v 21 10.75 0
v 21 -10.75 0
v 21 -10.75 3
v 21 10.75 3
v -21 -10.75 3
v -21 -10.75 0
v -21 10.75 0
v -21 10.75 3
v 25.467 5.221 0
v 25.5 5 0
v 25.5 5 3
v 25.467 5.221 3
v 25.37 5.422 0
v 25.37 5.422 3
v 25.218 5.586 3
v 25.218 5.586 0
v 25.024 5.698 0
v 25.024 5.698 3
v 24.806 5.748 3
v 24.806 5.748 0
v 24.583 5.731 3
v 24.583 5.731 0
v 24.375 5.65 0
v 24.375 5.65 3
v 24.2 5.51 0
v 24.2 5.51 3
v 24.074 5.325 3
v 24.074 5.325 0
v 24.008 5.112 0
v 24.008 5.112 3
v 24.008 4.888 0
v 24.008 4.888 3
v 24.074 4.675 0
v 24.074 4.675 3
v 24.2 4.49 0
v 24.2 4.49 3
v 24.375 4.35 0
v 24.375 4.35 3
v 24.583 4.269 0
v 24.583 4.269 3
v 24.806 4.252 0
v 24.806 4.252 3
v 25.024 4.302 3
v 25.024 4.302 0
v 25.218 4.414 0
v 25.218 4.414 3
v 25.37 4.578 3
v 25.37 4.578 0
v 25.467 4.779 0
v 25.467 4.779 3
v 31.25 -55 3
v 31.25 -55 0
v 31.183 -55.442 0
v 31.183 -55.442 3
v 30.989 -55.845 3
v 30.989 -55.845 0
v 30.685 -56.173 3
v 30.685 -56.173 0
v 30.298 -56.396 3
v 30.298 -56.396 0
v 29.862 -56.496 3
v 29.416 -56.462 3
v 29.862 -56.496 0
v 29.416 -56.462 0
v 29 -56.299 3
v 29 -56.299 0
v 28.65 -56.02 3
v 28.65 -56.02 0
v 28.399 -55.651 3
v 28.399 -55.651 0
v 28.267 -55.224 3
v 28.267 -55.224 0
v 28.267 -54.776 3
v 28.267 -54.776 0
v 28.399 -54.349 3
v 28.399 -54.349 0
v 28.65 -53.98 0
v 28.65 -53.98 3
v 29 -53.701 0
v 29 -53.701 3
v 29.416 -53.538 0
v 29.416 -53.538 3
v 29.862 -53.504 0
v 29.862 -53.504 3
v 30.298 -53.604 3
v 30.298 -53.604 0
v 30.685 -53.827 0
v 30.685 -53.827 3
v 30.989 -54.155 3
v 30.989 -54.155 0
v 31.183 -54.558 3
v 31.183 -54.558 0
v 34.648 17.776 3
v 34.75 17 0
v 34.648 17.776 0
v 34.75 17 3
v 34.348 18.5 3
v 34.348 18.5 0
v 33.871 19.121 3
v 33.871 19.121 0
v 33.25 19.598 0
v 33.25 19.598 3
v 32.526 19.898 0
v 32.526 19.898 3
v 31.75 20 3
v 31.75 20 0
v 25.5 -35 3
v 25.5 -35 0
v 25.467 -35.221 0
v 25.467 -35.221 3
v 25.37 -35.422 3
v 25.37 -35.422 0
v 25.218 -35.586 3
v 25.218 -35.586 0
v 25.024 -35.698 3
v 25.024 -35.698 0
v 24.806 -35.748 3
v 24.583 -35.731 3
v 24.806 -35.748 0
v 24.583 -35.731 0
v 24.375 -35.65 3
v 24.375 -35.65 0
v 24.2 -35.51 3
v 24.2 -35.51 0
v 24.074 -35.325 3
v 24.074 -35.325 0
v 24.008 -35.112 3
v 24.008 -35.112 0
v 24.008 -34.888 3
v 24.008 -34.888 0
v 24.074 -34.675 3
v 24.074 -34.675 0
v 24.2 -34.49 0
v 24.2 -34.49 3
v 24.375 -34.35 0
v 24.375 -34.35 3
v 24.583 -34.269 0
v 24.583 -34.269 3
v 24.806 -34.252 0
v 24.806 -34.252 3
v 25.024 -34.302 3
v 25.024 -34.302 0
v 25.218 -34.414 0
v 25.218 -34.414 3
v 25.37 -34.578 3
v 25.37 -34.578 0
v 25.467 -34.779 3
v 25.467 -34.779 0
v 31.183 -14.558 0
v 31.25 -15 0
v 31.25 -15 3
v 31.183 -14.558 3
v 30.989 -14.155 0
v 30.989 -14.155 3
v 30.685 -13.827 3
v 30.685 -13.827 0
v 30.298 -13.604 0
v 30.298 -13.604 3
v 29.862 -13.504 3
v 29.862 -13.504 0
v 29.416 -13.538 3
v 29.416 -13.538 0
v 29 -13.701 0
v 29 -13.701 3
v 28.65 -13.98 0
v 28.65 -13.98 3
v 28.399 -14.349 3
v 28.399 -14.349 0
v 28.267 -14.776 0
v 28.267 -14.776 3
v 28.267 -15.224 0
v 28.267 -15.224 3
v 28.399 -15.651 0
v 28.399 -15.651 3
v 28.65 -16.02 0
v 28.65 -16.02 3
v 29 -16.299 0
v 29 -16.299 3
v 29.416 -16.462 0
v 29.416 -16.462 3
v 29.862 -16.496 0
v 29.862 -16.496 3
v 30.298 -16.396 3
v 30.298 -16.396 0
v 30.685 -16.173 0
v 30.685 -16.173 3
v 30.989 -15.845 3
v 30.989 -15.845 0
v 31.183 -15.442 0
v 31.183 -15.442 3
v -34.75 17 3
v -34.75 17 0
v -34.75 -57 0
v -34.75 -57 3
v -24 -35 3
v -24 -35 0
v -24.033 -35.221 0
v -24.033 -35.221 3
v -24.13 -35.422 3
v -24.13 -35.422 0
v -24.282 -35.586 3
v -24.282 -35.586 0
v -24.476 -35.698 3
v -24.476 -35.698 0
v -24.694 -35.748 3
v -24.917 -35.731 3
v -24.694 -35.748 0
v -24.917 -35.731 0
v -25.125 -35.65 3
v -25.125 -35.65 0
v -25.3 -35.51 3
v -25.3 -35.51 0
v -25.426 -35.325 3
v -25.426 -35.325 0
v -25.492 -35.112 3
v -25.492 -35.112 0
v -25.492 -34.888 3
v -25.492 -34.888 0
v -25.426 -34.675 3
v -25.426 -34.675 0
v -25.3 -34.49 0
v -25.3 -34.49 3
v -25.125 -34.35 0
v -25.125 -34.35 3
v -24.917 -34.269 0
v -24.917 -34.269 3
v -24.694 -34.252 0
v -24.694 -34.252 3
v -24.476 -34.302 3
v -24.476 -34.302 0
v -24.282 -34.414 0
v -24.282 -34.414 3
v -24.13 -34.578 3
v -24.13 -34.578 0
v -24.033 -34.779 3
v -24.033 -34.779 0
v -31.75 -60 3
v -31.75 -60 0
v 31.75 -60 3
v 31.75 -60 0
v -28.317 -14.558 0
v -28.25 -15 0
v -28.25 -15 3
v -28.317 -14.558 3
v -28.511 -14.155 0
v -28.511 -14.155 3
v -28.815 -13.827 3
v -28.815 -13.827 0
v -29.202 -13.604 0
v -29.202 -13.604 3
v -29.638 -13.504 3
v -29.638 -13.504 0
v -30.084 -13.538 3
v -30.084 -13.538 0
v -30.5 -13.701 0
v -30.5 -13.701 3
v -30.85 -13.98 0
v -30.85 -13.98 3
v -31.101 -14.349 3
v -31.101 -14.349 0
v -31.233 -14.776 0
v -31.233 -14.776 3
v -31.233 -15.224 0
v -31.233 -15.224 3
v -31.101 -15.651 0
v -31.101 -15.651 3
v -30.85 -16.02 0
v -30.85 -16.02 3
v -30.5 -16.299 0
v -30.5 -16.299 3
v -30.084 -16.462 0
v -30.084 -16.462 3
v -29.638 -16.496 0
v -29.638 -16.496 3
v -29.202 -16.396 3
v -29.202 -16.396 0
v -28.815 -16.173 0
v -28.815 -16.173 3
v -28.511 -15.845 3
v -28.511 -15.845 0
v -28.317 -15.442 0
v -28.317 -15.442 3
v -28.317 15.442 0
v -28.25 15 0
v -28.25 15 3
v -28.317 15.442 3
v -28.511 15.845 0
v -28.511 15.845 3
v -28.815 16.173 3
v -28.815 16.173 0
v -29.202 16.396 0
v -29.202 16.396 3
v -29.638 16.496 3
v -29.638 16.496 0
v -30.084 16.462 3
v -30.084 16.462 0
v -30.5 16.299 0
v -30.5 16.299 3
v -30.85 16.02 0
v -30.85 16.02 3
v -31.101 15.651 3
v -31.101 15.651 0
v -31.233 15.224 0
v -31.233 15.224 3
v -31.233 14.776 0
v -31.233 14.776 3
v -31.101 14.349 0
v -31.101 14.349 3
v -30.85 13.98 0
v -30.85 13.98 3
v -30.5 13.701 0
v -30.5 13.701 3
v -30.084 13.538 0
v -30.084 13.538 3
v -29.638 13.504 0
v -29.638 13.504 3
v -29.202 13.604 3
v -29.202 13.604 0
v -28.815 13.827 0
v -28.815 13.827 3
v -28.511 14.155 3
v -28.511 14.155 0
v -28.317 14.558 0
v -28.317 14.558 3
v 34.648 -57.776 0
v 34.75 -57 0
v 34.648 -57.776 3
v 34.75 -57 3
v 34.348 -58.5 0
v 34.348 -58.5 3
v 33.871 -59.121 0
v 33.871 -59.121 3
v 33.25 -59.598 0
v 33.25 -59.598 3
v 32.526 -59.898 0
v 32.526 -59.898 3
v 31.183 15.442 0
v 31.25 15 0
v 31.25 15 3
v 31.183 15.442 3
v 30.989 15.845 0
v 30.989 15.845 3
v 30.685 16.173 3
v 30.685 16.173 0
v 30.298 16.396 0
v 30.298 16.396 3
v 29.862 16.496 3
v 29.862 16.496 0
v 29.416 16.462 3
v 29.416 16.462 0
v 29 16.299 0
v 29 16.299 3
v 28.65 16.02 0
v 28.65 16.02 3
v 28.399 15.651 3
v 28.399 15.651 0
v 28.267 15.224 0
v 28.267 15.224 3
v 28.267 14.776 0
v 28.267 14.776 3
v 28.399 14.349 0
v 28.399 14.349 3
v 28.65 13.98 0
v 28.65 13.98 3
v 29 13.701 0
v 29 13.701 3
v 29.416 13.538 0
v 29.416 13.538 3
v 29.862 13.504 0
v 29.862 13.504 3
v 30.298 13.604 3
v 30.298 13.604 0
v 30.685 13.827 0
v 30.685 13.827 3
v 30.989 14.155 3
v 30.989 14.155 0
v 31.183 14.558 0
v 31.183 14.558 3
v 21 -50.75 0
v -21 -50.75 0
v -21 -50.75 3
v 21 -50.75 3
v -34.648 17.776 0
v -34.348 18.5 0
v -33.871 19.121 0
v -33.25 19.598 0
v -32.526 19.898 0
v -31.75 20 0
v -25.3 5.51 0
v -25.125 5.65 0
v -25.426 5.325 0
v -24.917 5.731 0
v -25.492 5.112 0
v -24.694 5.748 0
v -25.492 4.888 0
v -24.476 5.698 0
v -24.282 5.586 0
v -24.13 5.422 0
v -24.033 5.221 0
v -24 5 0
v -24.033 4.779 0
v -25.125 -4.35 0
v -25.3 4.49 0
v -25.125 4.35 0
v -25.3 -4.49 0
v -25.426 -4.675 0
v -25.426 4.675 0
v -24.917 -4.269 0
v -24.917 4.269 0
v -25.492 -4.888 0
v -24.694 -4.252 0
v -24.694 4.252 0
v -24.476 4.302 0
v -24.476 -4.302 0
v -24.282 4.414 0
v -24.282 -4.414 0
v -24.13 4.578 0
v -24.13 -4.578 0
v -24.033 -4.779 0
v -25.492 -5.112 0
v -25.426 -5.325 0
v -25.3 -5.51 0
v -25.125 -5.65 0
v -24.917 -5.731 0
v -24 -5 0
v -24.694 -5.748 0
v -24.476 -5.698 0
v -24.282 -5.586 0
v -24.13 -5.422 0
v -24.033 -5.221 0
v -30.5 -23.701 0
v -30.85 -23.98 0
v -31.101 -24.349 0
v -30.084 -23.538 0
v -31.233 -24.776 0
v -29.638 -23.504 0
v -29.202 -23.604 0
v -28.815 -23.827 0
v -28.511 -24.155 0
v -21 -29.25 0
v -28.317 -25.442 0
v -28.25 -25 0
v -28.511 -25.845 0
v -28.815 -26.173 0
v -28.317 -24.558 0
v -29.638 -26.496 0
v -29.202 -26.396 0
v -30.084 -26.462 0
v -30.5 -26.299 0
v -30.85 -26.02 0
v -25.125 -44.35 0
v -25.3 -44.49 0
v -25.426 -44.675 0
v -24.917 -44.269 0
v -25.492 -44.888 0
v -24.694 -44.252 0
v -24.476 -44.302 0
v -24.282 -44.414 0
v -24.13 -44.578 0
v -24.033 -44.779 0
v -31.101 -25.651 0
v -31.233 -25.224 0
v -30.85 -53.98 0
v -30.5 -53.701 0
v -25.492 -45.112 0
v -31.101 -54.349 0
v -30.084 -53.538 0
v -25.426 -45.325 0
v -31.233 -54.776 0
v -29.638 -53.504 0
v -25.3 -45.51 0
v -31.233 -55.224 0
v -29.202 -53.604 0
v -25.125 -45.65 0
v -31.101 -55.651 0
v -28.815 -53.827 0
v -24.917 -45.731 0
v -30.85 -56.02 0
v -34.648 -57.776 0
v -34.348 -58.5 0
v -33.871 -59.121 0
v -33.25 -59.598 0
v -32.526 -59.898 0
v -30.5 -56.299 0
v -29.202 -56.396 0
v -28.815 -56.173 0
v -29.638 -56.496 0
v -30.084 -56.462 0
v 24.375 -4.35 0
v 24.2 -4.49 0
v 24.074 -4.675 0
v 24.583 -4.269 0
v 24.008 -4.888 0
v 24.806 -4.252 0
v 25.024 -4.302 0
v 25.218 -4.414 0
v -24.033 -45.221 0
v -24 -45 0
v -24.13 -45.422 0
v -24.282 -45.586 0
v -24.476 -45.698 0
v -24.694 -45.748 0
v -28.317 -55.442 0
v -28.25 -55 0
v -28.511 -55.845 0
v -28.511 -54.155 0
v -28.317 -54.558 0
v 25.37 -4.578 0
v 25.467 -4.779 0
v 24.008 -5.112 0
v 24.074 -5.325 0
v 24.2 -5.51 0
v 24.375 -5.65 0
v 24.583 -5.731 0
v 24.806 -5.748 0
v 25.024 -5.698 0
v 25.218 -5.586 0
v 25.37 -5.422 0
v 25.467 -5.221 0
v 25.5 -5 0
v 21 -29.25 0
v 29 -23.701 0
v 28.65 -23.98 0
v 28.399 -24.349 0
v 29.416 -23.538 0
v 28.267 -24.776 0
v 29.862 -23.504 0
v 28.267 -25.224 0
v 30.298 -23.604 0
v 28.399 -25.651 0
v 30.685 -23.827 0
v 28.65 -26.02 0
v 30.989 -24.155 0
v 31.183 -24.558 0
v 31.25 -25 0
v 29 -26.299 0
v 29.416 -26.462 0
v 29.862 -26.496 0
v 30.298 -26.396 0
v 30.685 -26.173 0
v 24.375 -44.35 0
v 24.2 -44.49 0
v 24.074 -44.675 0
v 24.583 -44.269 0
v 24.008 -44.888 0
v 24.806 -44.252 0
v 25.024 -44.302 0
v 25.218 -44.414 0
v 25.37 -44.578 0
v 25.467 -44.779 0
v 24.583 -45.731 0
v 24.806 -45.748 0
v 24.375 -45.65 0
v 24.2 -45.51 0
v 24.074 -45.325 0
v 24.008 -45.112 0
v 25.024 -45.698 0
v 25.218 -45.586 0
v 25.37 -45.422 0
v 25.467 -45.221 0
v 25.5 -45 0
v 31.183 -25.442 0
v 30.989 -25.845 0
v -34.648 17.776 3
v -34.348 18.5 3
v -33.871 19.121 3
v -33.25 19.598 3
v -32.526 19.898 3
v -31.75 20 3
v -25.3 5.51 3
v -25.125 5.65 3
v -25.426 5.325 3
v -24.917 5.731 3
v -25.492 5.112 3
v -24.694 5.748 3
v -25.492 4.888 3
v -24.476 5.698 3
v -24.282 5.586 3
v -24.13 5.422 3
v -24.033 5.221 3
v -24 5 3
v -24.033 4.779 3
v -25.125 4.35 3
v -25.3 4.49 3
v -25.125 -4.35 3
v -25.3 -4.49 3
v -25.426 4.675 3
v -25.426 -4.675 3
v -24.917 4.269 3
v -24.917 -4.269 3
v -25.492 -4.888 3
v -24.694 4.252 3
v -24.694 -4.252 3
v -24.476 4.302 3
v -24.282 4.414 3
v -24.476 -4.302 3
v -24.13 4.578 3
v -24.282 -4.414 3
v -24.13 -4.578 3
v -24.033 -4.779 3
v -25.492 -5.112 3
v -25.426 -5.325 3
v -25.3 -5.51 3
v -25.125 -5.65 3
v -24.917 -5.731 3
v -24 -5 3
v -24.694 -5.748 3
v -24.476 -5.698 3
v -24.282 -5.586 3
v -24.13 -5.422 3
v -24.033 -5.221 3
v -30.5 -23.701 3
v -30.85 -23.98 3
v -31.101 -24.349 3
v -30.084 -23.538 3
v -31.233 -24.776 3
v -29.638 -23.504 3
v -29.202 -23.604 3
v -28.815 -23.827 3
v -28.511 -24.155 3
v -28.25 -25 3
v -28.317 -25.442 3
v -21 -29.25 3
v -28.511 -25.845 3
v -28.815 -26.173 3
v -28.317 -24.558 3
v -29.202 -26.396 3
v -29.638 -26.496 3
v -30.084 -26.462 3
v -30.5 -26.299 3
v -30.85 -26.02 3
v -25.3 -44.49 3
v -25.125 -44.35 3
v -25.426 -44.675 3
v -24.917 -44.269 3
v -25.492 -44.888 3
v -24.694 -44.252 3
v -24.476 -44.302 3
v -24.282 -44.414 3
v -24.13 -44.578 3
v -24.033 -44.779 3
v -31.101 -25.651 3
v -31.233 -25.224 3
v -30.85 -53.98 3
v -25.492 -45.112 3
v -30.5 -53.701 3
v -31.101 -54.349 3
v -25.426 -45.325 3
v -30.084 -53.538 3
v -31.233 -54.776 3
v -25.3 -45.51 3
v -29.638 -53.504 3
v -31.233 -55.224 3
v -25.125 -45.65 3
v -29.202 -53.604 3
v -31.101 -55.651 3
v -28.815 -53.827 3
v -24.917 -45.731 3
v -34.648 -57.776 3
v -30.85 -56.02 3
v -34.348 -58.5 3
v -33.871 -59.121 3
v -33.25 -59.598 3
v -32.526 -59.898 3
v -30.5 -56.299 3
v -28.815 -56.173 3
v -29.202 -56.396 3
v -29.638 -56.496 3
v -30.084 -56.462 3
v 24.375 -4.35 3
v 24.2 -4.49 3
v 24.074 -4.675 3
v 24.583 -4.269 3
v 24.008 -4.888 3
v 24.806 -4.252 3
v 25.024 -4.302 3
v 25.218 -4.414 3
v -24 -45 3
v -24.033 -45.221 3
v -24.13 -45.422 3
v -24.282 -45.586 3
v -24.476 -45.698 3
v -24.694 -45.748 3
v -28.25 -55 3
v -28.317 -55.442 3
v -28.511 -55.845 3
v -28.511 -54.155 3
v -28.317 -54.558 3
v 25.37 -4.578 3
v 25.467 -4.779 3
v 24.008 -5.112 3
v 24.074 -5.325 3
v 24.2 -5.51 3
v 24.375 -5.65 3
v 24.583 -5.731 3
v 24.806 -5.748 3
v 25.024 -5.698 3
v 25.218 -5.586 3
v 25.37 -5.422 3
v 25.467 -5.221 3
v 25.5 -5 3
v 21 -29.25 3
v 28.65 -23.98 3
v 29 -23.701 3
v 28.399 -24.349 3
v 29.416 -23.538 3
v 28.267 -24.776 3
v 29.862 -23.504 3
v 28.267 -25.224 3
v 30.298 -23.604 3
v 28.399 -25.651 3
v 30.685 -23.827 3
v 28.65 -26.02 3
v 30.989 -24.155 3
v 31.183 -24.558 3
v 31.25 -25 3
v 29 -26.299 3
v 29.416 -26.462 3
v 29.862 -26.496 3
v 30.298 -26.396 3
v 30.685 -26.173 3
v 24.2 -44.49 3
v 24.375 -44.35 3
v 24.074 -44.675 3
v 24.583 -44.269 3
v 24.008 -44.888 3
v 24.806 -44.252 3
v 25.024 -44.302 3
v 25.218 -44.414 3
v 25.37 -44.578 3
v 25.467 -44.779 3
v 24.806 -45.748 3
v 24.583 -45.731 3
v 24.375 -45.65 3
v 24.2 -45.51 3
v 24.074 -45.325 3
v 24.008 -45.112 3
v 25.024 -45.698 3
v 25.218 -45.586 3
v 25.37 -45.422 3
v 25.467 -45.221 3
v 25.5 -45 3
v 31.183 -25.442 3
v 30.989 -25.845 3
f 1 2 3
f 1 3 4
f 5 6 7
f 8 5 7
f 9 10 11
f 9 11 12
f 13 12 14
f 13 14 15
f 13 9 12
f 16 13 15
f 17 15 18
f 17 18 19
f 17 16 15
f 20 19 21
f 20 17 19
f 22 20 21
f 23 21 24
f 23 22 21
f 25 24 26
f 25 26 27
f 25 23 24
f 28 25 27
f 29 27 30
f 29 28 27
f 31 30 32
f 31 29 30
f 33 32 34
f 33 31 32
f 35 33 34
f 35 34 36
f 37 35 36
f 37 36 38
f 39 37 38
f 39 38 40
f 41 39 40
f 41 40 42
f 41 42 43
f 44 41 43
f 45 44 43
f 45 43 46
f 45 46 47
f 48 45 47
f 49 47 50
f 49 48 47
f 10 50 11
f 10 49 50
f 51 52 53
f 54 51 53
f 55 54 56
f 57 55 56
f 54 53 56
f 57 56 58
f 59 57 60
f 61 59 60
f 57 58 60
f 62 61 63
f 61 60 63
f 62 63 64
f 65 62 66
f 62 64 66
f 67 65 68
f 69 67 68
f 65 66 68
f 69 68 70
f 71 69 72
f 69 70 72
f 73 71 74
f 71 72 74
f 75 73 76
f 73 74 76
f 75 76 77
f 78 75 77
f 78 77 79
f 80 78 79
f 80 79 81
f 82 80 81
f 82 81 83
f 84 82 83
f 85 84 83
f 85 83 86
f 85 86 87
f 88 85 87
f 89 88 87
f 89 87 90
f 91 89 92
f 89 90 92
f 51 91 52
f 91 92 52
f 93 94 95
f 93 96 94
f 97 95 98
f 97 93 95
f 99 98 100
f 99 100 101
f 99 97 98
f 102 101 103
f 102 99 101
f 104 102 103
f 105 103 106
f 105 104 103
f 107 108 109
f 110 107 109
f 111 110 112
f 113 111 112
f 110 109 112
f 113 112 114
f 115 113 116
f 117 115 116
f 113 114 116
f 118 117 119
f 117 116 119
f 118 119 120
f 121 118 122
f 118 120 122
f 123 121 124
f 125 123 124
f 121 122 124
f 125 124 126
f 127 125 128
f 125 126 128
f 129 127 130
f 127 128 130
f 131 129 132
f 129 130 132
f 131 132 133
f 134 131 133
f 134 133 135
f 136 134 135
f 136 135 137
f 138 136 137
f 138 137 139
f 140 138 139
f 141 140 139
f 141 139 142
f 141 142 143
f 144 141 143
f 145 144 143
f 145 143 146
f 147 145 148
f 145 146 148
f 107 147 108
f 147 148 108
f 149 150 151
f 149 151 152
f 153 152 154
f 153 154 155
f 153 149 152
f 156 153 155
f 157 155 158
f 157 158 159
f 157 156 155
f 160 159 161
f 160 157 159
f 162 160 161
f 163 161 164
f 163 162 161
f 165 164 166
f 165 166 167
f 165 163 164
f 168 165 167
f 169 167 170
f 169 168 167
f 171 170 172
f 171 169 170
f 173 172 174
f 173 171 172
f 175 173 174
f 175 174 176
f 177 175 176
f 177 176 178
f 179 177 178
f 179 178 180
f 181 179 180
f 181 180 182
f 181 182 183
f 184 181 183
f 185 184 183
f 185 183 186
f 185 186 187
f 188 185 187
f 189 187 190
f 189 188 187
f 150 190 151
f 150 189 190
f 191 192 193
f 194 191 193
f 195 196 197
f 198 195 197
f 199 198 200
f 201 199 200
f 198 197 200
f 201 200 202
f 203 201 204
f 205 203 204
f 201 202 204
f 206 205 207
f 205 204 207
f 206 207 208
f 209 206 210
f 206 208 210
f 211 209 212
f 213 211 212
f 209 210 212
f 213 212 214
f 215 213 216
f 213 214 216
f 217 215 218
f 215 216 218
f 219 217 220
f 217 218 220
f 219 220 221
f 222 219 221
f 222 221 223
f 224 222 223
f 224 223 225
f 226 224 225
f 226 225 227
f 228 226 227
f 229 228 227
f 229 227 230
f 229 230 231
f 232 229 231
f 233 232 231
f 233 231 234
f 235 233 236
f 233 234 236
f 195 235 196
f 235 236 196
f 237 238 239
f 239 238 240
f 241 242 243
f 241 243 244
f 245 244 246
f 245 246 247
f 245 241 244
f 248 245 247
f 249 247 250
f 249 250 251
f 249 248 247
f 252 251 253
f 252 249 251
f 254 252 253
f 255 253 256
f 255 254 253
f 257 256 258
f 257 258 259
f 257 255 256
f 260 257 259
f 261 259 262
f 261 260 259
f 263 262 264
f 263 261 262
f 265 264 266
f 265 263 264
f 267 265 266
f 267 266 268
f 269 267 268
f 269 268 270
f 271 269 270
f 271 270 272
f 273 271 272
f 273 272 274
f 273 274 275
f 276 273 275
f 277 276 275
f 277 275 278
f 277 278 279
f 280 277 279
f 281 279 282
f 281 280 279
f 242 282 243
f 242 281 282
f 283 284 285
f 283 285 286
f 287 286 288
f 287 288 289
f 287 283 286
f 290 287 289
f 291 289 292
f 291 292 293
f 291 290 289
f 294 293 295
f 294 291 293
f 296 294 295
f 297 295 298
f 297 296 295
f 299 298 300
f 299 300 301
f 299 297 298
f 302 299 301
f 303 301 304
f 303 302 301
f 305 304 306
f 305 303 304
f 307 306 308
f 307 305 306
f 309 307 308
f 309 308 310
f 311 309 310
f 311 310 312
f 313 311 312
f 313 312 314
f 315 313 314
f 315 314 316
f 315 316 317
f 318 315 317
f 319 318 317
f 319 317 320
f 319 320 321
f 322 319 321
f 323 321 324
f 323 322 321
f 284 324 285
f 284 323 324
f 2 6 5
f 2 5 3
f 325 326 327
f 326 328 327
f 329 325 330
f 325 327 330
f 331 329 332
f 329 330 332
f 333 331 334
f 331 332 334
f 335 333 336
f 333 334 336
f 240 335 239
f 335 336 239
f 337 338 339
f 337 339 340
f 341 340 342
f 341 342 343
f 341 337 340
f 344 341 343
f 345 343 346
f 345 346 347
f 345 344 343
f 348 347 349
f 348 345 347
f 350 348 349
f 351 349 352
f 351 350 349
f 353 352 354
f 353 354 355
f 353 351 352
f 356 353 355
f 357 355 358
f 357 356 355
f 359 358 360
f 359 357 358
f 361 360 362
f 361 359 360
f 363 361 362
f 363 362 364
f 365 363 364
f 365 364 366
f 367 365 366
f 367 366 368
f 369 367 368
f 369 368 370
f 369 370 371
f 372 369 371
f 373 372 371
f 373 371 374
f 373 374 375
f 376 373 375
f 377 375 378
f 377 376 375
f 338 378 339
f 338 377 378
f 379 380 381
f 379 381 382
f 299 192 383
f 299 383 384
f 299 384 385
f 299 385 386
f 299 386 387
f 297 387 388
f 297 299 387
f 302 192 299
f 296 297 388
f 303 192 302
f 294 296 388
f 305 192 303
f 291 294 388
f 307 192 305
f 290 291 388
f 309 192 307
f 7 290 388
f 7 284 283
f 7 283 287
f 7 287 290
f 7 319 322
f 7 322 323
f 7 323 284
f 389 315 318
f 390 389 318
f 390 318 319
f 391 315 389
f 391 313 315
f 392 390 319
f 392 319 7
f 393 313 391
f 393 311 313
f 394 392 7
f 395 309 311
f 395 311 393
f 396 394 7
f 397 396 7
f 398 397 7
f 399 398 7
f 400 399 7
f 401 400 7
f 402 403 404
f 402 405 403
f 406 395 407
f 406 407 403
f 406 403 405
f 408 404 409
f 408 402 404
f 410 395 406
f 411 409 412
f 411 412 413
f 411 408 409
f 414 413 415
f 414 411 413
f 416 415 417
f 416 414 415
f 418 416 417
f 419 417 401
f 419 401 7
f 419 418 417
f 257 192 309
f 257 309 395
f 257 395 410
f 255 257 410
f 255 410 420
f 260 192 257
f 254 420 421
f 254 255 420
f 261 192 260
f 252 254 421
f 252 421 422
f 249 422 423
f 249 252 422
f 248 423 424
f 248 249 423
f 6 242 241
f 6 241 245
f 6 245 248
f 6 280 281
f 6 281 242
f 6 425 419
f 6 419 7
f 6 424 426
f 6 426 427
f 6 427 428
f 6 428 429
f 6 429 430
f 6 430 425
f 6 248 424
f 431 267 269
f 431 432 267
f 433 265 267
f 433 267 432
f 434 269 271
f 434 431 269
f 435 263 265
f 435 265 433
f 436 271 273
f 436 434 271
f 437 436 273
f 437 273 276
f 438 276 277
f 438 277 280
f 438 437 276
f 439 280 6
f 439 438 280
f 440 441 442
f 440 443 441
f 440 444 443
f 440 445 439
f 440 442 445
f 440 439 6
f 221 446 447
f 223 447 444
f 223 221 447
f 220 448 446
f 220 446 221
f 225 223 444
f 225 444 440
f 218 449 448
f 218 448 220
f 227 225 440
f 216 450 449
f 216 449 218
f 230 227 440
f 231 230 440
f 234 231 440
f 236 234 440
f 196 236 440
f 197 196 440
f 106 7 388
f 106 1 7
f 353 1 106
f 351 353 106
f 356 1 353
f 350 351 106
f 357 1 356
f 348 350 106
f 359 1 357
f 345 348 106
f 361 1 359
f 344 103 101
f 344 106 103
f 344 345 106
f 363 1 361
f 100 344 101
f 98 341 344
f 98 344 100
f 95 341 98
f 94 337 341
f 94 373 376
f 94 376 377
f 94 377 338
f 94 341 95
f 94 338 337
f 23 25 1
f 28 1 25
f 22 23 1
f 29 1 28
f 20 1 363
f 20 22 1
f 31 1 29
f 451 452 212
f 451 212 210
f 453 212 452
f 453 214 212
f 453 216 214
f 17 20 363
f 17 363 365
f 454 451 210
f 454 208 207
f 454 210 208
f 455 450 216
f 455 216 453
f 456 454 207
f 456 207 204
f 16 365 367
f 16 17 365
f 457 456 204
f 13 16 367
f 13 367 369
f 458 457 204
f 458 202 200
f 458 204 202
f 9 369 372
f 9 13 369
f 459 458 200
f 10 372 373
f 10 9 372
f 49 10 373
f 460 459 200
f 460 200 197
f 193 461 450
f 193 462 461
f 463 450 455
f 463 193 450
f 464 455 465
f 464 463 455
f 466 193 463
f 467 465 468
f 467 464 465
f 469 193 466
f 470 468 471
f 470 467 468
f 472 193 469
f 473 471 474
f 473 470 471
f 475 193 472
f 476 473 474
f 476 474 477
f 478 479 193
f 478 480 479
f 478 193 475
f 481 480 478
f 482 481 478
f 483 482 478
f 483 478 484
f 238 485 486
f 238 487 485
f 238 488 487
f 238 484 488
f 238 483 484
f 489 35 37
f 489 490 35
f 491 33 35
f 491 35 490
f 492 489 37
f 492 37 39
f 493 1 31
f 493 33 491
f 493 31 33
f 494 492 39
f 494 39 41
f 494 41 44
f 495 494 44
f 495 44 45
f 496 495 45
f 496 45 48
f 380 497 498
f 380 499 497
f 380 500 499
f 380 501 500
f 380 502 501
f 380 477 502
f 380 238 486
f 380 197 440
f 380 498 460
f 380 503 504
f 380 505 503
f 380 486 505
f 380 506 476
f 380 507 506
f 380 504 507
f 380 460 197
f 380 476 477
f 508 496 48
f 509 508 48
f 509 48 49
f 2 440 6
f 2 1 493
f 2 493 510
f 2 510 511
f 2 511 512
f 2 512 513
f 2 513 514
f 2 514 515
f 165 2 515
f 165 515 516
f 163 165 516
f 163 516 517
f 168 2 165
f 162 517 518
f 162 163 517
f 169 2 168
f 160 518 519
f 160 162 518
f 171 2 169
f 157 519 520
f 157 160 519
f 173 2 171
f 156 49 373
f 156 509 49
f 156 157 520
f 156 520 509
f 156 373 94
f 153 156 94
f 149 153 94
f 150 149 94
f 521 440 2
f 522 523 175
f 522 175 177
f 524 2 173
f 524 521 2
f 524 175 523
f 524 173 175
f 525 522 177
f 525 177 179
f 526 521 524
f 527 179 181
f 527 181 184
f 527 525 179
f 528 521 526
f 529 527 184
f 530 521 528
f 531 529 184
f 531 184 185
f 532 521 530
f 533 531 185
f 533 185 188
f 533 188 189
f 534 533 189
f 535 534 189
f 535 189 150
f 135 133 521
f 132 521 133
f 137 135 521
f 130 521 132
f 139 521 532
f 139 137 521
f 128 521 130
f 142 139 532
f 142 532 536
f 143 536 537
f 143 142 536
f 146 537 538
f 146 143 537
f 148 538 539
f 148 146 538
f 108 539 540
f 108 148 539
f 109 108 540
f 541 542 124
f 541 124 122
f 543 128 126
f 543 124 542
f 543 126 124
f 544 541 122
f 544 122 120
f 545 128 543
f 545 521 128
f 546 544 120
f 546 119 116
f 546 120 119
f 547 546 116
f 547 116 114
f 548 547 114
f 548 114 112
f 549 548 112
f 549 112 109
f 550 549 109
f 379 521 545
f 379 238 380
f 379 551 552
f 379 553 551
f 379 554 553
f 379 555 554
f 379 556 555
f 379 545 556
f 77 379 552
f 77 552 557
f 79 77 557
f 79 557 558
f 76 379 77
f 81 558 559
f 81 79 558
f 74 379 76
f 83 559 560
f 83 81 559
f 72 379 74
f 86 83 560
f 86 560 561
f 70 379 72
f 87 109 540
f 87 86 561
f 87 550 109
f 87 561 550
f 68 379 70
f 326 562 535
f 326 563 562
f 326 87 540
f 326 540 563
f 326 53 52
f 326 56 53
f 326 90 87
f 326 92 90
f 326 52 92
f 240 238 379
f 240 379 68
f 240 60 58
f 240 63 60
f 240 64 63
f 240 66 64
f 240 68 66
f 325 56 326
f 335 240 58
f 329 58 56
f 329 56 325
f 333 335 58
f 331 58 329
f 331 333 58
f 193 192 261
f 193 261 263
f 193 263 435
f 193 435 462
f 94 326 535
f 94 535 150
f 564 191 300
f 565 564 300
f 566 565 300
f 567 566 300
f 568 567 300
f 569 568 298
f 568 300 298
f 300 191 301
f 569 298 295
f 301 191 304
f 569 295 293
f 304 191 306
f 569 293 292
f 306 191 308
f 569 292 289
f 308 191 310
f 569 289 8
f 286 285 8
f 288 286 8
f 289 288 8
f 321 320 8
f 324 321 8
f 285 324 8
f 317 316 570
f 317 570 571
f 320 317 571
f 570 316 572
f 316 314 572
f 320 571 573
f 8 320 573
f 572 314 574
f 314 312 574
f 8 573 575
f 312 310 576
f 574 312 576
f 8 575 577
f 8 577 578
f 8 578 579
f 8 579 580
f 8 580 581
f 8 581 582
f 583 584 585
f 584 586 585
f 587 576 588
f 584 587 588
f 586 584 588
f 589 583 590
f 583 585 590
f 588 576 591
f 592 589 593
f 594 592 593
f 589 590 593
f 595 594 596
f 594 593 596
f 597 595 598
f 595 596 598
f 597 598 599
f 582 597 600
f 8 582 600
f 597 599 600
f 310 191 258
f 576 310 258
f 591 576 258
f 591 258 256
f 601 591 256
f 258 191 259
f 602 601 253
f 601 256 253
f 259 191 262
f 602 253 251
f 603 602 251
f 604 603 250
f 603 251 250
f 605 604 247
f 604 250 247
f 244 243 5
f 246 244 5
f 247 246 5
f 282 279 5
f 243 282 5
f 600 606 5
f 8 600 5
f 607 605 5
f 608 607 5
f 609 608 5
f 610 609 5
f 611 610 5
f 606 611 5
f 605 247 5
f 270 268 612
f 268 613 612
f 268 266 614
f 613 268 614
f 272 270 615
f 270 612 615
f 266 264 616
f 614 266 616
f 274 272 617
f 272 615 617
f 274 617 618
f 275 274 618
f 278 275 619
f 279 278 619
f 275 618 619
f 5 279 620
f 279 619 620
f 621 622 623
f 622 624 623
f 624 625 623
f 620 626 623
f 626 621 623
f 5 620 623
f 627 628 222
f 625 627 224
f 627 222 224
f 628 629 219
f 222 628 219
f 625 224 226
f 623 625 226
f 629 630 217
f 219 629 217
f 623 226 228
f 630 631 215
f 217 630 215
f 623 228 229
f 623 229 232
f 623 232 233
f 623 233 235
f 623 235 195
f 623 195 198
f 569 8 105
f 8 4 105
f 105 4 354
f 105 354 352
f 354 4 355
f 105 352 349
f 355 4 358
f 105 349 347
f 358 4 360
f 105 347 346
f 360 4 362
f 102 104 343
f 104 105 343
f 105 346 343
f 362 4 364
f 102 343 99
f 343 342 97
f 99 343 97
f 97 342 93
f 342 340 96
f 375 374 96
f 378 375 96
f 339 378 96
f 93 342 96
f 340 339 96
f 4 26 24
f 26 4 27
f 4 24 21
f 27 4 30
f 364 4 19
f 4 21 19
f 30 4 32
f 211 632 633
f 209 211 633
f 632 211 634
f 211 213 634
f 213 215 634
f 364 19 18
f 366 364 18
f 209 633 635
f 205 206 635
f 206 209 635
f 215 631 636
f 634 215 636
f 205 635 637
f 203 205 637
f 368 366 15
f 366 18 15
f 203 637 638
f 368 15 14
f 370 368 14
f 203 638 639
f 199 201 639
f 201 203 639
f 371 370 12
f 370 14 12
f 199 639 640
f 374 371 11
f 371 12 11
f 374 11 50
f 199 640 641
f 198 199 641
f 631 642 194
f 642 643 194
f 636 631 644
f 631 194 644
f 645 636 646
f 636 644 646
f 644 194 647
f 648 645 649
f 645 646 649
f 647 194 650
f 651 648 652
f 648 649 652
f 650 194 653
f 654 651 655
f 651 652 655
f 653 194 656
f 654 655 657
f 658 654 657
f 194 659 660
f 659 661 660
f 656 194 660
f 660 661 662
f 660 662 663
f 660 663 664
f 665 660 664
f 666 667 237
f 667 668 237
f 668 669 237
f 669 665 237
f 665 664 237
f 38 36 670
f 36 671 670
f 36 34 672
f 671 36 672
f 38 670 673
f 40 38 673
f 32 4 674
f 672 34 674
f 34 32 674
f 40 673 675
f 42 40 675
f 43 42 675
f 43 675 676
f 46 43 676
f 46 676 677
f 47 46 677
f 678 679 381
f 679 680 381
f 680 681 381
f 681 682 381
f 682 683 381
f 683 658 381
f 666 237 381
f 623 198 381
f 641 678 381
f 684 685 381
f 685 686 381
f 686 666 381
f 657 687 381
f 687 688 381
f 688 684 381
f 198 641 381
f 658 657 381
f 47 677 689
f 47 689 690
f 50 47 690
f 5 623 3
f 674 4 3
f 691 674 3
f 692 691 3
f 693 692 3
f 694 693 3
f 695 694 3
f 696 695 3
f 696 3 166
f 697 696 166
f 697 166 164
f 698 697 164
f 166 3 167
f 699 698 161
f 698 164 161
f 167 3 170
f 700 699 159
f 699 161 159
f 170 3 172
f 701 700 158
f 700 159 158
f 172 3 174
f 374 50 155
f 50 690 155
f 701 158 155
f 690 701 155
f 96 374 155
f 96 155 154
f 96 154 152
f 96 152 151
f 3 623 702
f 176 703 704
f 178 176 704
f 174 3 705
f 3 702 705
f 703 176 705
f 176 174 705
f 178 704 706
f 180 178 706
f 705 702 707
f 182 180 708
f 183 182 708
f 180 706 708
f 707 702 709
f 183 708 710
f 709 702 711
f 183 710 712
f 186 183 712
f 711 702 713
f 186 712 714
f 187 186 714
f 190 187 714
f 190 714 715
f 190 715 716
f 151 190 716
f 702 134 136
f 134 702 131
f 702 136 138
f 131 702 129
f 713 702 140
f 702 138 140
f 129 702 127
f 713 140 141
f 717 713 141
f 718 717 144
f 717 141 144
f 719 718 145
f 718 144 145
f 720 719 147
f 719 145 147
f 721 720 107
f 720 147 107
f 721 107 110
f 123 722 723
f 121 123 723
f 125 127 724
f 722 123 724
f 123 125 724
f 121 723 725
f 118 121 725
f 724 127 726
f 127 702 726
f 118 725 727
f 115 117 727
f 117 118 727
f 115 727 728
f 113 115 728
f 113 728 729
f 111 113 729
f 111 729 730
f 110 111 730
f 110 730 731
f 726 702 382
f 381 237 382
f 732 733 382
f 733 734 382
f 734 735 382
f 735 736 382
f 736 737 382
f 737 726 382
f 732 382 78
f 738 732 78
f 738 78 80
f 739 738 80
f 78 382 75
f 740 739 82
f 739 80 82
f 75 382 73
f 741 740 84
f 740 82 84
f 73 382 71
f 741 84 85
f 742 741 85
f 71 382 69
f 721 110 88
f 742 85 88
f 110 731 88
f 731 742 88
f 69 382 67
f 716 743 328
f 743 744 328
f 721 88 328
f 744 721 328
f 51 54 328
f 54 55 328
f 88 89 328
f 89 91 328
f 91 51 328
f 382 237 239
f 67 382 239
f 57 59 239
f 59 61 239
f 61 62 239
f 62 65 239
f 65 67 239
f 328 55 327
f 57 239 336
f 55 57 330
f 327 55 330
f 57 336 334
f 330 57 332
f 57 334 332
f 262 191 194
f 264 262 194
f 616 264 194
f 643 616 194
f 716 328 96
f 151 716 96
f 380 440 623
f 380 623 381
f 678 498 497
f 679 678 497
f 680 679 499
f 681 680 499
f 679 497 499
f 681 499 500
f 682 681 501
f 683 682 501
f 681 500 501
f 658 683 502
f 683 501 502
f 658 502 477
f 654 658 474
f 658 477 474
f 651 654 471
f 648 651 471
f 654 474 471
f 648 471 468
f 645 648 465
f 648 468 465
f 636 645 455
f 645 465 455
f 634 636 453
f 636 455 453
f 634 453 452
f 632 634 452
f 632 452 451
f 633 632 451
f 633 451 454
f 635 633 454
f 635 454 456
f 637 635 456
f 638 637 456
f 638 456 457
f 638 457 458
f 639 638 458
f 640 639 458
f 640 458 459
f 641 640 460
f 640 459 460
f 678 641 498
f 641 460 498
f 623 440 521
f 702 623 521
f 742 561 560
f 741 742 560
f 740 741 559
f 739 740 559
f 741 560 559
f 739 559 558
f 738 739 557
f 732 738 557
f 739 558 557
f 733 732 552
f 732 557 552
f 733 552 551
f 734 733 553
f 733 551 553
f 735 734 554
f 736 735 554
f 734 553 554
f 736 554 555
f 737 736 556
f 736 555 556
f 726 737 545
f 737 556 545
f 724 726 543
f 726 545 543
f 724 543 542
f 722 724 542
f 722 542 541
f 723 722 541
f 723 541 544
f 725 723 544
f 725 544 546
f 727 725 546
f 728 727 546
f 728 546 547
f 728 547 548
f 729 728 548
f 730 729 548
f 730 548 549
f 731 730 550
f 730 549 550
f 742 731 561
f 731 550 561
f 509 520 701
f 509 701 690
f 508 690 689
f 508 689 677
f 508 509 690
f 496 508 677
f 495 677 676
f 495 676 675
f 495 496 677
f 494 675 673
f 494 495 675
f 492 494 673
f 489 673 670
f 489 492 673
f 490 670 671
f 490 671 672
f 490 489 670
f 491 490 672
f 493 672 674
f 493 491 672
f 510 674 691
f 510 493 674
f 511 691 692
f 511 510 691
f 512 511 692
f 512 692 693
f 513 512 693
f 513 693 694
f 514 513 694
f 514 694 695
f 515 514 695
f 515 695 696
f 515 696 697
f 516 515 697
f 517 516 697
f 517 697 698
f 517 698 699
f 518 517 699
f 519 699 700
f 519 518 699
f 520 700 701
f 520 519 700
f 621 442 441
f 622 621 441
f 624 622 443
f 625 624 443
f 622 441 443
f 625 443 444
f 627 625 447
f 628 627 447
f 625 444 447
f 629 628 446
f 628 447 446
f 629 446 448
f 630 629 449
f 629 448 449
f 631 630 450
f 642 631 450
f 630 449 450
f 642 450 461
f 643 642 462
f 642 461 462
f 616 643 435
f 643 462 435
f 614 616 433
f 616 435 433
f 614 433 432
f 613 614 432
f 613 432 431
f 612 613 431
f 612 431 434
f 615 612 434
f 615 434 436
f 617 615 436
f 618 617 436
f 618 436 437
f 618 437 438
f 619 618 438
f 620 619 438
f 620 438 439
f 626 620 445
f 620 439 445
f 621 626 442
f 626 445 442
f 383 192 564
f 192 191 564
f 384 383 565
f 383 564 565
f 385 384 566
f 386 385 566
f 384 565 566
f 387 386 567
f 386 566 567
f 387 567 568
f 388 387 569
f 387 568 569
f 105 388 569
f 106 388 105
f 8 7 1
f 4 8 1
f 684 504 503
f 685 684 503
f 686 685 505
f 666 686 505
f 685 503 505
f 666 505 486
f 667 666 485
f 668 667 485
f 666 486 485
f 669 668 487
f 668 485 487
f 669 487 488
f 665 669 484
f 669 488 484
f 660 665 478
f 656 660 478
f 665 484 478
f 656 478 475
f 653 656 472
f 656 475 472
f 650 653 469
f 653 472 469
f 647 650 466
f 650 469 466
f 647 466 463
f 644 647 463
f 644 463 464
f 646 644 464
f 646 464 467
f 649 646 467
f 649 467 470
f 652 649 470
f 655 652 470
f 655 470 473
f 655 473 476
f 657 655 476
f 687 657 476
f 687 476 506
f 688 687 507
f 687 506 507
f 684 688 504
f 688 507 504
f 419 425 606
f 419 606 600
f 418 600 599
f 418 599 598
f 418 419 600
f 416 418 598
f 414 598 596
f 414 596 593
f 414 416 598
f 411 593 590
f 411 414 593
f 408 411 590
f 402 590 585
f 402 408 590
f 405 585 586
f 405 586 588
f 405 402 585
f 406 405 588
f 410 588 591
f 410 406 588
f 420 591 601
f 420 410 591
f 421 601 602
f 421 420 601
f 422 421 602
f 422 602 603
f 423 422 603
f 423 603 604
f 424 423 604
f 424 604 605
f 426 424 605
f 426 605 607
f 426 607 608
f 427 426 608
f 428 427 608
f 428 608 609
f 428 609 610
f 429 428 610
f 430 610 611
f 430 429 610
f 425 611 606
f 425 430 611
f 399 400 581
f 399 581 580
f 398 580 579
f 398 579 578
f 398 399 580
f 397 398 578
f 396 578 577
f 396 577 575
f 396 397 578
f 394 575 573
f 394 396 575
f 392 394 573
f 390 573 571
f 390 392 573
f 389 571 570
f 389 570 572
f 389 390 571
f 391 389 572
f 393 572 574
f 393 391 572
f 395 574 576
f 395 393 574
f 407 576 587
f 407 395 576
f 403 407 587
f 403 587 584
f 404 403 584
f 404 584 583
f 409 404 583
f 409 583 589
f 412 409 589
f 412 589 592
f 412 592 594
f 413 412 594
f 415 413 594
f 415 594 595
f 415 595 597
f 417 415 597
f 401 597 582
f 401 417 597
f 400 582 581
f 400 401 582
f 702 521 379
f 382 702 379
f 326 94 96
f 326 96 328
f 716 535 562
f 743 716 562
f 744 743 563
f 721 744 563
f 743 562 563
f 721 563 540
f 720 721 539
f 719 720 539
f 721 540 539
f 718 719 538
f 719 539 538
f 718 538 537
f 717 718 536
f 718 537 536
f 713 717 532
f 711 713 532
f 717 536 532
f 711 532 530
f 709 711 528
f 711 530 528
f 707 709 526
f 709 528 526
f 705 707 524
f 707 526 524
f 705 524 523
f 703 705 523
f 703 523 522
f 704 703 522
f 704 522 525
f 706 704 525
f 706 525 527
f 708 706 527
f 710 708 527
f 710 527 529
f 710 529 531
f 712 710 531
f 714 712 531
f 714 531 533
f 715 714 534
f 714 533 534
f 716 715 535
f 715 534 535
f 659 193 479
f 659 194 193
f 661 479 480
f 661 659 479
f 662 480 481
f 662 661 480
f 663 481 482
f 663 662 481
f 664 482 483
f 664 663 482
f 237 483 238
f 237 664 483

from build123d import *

# Parameters (mm, degrees)
F0_W     = 69.5
F0_H     = 40
F0_R     = 1.5
F0_R_2   = 0.75
F0_W_2   = 42
F0_H_2   = 21.5
F1_DEPTH = 3
F3_R     = 3


with BuildPart() as f1:
    # F0 (on Top) → F1 (new body)
    with BuildSketch(Plane.XY):
        Rectangle(F0_W, F0_H)
        with Locations((-29.75, -15)):
            Circle(F0_R, mode=Mode.SUBTRACT)
        with Locations((-24.75, -5)):
            Circle(F0_R_2, mode=Mode.SUBTRACT)
        with Locations((29.75, -15)):
            Circle(F0_R, mode=Mode.SUBTRACT)
        with Locations((24.75, -5)):
            Circle(F0_R_2, mode=Mode.SUBTRACT)
        with Locations((-24.75, 5)):
            Circle(F0_R_2, mode=Mode.SUBTRACT)
        with Locations((-29.75, 15)):
            Circle(F0_R, mode=Mode.SUBTRACT)
        Rectangle(F0_W_2, F0_H_2, mode=Mode.SUBTRACT)
        with Locations((24.75, 5)):
            Circle(F0_R_2, mode=Mode.SUBTRACT)
        with Locations((29.75, 15)):
            Circle(F0_R, mode=Mode.SUBTRACT)
    extrude(amount=F1_DEPTH)

    # F2: F1 across face


with BuildPart() as f1_1:
    add(f1.part)
    add(f1.part.mirror(Plane(origin=(0, -20, 1.5), x_dir=(1, 0, 0), z_dir=(0, -1, 0))))

    # F3
    f3_edges = [f1_1.edges().sort_by_distance(p)[0] for p in [
        (-34.75, -60, 1.5),
        (34.75, -60, 1.5),
        (34.75, 20, 1.5),
        (-34.75, 20, 1.5),
    ]]
    fillet(f3_edges, radius=F3_R)


solid = f1_1.part
